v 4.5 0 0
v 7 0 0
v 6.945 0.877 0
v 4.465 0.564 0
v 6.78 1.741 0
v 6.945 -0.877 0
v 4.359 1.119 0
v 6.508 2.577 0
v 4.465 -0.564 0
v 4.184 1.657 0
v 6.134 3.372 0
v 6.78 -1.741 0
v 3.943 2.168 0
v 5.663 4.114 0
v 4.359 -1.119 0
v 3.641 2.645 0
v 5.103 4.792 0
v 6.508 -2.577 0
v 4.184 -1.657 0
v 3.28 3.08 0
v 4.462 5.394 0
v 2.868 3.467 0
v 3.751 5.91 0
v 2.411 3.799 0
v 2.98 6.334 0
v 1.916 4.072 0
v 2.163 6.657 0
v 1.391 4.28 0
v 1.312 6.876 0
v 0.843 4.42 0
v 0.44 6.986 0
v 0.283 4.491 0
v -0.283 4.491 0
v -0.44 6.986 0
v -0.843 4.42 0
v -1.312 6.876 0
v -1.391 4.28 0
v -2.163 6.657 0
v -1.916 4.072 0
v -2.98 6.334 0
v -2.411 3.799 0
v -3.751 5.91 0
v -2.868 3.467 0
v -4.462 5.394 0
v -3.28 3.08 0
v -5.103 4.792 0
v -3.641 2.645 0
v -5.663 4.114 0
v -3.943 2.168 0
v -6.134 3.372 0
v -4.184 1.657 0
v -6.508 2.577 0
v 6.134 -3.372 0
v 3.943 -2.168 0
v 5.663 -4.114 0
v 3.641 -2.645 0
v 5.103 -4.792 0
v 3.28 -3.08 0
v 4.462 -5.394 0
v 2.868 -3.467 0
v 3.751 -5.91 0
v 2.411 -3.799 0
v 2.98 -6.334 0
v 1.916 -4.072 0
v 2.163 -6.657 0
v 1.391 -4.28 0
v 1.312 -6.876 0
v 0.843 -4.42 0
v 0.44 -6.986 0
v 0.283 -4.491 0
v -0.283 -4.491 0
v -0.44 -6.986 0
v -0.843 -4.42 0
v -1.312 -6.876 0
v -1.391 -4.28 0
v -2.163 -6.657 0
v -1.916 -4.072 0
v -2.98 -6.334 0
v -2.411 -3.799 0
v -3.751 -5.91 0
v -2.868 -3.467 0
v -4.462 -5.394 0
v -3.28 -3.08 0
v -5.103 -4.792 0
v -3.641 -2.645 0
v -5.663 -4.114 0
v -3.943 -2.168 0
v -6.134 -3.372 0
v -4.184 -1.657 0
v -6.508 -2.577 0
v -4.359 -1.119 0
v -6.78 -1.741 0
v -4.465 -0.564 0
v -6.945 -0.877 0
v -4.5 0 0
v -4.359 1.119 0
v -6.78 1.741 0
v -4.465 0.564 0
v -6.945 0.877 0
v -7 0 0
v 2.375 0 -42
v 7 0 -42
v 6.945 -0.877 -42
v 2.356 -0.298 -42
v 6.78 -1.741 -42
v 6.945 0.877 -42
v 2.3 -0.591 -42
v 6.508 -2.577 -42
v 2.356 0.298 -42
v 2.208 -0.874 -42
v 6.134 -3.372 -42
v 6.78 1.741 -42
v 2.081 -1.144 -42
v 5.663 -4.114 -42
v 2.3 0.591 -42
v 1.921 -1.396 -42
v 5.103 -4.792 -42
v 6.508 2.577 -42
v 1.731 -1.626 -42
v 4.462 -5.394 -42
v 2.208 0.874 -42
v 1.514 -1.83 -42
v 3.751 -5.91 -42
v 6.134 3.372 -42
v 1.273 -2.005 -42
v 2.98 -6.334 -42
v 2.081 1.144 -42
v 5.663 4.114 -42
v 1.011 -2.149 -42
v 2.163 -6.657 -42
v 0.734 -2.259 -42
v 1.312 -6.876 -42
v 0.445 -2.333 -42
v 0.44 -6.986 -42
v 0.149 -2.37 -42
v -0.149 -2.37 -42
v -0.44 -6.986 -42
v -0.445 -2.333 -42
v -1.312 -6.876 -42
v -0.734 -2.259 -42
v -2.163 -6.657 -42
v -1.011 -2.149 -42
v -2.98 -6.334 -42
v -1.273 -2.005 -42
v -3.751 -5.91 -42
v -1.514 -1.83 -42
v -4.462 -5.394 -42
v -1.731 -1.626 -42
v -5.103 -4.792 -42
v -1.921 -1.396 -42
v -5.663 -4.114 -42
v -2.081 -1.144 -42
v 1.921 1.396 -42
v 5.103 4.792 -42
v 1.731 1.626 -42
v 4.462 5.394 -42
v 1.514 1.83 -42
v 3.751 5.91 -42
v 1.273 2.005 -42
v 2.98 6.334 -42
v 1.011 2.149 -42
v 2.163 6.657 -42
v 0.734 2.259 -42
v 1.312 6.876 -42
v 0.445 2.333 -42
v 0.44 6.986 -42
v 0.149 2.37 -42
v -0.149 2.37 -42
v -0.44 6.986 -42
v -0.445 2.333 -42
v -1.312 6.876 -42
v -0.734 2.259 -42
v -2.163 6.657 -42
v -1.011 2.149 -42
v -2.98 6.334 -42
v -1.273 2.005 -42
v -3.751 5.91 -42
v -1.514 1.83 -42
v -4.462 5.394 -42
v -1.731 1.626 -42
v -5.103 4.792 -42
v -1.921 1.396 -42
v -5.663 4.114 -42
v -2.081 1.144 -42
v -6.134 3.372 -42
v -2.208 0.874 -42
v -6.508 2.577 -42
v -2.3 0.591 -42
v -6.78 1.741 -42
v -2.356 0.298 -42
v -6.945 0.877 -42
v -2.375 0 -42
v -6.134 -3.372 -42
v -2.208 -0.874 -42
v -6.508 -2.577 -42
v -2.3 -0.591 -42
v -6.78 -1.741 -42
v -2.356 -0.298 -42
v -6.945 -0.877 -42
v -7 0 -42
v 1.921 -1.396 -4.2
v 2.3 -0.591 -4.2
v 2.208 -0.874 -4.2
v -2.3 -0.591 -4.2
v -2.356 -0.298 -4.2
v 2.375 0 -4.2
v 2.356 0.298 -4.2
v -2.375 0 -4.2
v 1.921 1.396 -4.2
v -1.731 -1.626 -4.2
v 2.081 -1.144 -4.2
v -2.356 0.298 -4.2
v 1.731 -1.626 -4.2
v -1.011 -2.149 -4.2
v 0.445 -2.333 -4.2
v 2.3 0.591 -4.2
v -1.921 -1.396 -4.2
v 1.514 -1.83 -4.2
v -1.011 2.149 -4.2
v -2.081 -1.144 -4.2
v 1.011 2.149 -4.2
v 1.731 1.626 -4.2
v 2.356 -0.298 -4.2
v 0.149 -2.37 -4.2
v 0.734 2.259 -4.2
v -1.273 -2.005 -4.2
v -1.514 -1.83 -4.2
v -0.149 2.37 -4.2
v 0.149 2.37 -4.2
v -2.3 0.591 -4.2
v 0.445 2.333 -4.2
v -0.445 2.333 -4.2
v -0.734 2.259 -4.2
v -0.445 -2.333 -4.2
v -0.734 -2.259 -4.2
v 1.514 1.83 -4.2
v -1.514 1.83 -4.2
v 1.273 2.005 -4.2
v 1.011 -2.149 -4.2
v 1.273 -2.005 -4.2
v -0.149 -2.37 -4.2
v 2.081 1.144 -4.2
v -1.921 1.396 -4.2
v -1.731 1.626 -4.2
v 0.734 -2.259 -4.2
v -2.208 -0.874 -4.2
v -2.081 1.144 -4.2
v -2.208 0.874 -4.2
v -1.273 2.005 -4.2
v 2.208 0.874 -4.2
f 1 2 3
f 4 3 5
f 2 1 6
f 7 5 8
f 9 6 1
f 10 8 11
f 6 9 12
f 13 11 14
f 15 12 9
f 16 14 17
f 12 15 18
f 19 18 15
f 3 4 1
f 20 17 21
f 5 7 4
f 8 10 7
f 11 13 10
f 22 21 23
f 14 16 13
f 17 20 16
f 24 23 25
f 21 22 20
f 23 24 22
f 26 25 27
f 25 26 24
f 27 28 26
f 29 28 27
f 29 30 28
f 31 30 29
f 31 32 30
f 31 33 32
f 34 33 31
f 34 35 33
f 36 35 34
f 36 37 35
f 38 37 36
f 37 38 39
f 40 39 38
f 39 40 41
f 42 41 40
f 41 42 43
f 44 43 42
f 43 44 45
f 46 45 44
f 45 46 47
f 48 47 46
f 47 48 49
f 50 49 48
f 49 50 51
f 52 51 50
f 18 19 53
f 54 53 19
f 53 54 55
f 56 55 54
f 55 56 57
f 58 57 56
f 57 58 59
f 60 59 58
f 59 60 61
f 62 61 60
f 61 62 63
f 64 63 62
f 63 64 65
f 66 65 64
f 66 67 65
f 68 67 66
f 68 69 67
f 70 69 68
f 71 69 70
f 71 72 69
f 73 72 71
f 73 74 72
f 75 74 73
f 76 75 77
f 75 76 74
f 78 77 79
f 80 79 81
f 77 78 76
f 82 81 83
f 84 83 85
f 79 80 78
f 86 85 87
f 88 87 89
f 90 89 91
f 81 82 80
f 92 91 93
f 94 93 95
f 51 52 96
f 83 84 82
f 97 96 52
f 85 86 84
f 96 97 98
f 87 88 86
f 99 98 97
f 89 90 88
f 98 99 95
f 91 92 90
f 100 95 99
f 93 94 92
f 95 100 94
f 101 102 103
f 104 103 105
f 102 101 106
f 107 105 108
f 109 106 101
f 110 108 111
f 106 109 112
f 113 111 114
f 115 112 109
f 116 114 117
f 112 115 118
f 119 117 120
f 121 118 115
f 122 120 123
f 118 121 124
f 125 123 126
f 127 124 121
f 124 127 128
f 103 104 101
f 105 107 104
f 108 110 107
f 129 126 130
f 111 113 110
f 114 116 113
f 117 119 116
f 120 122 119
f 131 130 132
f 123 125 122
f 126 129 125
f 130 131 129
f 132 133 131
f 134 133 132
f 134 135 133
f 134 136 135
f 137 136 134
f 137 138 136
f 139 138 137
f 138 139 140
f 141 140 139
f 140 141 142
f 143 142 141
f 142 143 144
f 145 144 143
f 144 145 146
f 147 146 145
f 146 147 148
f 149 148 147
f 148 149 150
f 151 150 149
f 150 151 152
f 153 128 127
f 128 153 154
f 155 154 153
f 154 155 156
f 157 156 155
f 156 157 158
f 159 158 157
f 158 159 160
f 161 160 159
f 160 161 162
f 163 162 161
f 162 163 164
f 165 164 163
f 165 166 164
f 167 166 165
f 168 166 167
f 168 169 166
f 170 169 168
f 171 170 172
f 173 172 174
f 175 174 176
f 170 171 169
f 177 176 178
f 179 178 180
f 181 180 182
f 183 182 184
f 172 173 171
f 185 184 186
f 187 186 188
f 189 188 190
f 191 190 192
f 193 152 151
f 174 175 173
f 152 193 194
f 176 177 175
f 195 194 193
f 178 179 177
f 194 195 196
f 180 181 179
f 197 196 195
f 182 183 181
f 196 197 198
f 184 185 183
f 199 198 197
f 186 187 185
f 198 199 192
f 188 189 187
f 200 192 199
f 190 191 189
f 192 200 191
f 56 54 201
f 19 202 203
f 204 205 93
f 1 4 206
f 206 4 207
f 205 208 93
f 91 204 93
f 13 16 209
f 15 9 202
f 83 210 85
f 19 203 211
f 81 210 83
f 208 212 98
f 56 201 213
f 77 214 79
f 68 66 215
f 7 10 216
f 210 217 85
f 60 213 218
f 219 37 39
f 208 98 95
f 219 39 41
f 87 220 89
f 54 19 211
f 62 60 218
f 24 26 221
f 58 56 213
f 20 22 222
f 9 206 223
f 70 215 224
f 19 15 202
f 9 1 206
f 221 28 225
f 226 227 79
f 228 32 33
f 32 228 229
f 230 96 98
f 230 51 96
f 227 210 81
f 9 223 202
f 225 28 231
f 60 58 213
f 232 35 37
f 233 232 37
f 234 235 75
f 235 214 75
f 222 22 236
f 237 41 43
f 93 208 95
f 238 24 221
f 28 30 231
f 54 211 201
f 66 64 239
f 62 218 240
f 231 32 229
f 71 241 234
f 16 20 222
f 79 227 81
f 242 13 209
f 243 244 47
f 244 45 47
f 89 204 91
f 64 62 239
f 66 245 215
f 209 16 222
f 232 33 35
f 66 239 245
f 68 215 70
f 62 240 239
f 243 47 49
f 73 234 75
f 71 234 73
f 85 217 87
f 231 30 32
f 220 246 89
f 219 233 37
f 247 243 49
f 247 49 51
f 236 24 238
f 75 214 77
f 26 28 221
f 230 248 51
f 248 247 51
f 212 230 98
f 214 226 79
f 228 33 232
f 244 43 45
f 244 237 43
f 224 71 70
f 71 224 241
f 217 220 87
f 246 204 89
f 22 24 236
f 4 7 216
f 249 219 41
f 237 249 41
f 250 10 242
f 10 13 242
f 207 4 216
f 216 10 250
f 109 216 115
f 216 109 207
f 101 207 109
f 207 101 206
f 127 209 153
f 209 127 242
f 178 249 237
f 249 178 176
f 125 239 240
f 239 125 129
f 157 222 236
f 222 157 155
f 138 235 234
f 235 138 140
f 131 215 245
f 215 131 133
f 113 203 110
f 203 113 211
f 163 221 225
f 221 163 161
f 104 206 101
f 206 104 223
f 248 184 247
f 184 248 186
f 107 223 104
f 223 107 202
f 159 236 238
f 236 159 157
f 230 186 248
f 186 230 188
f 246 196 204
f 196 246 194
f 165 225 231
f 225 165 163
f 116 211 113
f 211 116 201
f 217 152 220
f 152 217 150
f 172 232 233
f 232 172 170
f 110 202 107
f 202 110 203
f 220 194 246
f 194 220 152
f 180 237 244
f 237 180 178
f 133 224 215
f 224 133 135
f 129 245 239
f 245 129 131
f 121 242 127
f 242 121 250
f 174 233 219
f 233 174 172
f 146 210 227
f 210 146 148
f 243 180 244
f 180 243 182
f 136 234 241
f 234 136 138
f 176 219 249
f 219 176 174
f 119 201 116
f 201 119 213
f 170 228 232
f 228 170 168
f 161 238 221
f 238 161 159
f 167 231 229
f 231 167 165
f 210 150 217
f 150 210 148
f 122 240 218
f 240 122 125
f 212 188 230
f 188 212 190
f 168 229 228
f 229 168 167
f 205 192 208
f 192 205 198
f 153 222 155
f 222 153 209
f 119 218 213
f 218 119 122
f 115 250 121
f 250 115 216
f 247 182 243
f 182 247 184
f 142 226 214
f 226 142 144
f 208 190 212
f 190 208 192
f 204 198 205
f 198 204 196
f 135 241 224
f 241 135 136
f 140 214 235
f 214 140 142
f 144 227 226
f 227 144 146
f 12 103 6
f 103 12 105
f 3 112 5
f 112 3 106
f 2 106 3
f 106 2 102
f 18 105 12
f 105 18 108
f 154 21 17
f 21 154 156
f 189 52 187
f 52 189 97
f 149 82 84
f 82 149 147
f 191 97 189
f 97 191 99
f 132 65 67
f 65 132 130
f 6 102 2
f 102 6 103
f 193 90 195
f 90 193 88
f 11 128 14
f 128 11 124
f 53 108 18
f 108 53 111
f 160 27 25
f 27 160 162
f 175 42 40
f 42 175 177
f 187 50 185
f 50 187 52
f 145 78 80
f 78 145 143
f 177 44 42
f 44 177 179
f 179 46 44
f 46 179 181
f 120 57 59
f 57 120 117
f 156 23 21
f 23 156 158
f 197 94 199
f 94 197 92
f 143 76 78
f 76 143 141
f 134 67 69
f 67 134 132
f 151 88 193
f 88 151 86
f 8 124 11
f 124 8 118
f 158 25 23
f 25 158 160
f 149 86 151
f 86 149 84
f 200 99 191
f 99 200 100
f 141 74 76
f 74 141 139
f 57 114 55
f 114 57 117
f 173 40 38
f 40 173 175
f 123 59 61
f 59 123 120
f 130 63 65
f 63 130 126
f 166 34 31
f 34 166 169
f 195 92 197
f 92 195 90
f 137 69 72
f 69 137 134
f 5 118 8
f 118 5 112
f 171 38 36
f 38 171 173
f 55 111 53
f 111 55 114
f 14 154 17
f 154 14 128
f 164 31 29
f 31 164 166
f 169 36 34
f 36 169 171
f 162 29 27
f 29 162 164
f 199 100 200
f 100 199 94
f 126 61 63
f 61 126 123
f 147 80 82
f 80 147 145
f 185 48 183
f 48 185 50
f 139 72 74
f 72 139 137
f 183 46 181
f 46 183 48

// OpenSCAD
$fn = 50;


difference() {
	union() {
		translate(v = [0, 0, -42.0000000000]) {
			cylinder(h = 42, r = 7.0000000000);
		}
	}
	union() {
		translate(v = [0, 0, 0]) {
			rotate(a = [0, 0, 0]) {
				difference() {
					union() {
						#translate(v = [0, 0, -42.0000000000]) {
							cylinder(h = 42, r = 2.2500000000);
						}
						#translate(v = [0, 0, -4.2000000000]) {
							cylinder(h = 4.2000000000, r1 = 2.3750000000, r2 = 4.5000000000);
						}
						#translate(v = [0, 0, -42.0000000000]) {
							cylinder(h = 42, r = 2.3750000000);
						}
						#translate(v = [0, 0, -42.0000000000]) {
							cylinder(h = 42, r = 2.2500000000);
						}
					}
					union();
				}
			}
		}
	}
}
